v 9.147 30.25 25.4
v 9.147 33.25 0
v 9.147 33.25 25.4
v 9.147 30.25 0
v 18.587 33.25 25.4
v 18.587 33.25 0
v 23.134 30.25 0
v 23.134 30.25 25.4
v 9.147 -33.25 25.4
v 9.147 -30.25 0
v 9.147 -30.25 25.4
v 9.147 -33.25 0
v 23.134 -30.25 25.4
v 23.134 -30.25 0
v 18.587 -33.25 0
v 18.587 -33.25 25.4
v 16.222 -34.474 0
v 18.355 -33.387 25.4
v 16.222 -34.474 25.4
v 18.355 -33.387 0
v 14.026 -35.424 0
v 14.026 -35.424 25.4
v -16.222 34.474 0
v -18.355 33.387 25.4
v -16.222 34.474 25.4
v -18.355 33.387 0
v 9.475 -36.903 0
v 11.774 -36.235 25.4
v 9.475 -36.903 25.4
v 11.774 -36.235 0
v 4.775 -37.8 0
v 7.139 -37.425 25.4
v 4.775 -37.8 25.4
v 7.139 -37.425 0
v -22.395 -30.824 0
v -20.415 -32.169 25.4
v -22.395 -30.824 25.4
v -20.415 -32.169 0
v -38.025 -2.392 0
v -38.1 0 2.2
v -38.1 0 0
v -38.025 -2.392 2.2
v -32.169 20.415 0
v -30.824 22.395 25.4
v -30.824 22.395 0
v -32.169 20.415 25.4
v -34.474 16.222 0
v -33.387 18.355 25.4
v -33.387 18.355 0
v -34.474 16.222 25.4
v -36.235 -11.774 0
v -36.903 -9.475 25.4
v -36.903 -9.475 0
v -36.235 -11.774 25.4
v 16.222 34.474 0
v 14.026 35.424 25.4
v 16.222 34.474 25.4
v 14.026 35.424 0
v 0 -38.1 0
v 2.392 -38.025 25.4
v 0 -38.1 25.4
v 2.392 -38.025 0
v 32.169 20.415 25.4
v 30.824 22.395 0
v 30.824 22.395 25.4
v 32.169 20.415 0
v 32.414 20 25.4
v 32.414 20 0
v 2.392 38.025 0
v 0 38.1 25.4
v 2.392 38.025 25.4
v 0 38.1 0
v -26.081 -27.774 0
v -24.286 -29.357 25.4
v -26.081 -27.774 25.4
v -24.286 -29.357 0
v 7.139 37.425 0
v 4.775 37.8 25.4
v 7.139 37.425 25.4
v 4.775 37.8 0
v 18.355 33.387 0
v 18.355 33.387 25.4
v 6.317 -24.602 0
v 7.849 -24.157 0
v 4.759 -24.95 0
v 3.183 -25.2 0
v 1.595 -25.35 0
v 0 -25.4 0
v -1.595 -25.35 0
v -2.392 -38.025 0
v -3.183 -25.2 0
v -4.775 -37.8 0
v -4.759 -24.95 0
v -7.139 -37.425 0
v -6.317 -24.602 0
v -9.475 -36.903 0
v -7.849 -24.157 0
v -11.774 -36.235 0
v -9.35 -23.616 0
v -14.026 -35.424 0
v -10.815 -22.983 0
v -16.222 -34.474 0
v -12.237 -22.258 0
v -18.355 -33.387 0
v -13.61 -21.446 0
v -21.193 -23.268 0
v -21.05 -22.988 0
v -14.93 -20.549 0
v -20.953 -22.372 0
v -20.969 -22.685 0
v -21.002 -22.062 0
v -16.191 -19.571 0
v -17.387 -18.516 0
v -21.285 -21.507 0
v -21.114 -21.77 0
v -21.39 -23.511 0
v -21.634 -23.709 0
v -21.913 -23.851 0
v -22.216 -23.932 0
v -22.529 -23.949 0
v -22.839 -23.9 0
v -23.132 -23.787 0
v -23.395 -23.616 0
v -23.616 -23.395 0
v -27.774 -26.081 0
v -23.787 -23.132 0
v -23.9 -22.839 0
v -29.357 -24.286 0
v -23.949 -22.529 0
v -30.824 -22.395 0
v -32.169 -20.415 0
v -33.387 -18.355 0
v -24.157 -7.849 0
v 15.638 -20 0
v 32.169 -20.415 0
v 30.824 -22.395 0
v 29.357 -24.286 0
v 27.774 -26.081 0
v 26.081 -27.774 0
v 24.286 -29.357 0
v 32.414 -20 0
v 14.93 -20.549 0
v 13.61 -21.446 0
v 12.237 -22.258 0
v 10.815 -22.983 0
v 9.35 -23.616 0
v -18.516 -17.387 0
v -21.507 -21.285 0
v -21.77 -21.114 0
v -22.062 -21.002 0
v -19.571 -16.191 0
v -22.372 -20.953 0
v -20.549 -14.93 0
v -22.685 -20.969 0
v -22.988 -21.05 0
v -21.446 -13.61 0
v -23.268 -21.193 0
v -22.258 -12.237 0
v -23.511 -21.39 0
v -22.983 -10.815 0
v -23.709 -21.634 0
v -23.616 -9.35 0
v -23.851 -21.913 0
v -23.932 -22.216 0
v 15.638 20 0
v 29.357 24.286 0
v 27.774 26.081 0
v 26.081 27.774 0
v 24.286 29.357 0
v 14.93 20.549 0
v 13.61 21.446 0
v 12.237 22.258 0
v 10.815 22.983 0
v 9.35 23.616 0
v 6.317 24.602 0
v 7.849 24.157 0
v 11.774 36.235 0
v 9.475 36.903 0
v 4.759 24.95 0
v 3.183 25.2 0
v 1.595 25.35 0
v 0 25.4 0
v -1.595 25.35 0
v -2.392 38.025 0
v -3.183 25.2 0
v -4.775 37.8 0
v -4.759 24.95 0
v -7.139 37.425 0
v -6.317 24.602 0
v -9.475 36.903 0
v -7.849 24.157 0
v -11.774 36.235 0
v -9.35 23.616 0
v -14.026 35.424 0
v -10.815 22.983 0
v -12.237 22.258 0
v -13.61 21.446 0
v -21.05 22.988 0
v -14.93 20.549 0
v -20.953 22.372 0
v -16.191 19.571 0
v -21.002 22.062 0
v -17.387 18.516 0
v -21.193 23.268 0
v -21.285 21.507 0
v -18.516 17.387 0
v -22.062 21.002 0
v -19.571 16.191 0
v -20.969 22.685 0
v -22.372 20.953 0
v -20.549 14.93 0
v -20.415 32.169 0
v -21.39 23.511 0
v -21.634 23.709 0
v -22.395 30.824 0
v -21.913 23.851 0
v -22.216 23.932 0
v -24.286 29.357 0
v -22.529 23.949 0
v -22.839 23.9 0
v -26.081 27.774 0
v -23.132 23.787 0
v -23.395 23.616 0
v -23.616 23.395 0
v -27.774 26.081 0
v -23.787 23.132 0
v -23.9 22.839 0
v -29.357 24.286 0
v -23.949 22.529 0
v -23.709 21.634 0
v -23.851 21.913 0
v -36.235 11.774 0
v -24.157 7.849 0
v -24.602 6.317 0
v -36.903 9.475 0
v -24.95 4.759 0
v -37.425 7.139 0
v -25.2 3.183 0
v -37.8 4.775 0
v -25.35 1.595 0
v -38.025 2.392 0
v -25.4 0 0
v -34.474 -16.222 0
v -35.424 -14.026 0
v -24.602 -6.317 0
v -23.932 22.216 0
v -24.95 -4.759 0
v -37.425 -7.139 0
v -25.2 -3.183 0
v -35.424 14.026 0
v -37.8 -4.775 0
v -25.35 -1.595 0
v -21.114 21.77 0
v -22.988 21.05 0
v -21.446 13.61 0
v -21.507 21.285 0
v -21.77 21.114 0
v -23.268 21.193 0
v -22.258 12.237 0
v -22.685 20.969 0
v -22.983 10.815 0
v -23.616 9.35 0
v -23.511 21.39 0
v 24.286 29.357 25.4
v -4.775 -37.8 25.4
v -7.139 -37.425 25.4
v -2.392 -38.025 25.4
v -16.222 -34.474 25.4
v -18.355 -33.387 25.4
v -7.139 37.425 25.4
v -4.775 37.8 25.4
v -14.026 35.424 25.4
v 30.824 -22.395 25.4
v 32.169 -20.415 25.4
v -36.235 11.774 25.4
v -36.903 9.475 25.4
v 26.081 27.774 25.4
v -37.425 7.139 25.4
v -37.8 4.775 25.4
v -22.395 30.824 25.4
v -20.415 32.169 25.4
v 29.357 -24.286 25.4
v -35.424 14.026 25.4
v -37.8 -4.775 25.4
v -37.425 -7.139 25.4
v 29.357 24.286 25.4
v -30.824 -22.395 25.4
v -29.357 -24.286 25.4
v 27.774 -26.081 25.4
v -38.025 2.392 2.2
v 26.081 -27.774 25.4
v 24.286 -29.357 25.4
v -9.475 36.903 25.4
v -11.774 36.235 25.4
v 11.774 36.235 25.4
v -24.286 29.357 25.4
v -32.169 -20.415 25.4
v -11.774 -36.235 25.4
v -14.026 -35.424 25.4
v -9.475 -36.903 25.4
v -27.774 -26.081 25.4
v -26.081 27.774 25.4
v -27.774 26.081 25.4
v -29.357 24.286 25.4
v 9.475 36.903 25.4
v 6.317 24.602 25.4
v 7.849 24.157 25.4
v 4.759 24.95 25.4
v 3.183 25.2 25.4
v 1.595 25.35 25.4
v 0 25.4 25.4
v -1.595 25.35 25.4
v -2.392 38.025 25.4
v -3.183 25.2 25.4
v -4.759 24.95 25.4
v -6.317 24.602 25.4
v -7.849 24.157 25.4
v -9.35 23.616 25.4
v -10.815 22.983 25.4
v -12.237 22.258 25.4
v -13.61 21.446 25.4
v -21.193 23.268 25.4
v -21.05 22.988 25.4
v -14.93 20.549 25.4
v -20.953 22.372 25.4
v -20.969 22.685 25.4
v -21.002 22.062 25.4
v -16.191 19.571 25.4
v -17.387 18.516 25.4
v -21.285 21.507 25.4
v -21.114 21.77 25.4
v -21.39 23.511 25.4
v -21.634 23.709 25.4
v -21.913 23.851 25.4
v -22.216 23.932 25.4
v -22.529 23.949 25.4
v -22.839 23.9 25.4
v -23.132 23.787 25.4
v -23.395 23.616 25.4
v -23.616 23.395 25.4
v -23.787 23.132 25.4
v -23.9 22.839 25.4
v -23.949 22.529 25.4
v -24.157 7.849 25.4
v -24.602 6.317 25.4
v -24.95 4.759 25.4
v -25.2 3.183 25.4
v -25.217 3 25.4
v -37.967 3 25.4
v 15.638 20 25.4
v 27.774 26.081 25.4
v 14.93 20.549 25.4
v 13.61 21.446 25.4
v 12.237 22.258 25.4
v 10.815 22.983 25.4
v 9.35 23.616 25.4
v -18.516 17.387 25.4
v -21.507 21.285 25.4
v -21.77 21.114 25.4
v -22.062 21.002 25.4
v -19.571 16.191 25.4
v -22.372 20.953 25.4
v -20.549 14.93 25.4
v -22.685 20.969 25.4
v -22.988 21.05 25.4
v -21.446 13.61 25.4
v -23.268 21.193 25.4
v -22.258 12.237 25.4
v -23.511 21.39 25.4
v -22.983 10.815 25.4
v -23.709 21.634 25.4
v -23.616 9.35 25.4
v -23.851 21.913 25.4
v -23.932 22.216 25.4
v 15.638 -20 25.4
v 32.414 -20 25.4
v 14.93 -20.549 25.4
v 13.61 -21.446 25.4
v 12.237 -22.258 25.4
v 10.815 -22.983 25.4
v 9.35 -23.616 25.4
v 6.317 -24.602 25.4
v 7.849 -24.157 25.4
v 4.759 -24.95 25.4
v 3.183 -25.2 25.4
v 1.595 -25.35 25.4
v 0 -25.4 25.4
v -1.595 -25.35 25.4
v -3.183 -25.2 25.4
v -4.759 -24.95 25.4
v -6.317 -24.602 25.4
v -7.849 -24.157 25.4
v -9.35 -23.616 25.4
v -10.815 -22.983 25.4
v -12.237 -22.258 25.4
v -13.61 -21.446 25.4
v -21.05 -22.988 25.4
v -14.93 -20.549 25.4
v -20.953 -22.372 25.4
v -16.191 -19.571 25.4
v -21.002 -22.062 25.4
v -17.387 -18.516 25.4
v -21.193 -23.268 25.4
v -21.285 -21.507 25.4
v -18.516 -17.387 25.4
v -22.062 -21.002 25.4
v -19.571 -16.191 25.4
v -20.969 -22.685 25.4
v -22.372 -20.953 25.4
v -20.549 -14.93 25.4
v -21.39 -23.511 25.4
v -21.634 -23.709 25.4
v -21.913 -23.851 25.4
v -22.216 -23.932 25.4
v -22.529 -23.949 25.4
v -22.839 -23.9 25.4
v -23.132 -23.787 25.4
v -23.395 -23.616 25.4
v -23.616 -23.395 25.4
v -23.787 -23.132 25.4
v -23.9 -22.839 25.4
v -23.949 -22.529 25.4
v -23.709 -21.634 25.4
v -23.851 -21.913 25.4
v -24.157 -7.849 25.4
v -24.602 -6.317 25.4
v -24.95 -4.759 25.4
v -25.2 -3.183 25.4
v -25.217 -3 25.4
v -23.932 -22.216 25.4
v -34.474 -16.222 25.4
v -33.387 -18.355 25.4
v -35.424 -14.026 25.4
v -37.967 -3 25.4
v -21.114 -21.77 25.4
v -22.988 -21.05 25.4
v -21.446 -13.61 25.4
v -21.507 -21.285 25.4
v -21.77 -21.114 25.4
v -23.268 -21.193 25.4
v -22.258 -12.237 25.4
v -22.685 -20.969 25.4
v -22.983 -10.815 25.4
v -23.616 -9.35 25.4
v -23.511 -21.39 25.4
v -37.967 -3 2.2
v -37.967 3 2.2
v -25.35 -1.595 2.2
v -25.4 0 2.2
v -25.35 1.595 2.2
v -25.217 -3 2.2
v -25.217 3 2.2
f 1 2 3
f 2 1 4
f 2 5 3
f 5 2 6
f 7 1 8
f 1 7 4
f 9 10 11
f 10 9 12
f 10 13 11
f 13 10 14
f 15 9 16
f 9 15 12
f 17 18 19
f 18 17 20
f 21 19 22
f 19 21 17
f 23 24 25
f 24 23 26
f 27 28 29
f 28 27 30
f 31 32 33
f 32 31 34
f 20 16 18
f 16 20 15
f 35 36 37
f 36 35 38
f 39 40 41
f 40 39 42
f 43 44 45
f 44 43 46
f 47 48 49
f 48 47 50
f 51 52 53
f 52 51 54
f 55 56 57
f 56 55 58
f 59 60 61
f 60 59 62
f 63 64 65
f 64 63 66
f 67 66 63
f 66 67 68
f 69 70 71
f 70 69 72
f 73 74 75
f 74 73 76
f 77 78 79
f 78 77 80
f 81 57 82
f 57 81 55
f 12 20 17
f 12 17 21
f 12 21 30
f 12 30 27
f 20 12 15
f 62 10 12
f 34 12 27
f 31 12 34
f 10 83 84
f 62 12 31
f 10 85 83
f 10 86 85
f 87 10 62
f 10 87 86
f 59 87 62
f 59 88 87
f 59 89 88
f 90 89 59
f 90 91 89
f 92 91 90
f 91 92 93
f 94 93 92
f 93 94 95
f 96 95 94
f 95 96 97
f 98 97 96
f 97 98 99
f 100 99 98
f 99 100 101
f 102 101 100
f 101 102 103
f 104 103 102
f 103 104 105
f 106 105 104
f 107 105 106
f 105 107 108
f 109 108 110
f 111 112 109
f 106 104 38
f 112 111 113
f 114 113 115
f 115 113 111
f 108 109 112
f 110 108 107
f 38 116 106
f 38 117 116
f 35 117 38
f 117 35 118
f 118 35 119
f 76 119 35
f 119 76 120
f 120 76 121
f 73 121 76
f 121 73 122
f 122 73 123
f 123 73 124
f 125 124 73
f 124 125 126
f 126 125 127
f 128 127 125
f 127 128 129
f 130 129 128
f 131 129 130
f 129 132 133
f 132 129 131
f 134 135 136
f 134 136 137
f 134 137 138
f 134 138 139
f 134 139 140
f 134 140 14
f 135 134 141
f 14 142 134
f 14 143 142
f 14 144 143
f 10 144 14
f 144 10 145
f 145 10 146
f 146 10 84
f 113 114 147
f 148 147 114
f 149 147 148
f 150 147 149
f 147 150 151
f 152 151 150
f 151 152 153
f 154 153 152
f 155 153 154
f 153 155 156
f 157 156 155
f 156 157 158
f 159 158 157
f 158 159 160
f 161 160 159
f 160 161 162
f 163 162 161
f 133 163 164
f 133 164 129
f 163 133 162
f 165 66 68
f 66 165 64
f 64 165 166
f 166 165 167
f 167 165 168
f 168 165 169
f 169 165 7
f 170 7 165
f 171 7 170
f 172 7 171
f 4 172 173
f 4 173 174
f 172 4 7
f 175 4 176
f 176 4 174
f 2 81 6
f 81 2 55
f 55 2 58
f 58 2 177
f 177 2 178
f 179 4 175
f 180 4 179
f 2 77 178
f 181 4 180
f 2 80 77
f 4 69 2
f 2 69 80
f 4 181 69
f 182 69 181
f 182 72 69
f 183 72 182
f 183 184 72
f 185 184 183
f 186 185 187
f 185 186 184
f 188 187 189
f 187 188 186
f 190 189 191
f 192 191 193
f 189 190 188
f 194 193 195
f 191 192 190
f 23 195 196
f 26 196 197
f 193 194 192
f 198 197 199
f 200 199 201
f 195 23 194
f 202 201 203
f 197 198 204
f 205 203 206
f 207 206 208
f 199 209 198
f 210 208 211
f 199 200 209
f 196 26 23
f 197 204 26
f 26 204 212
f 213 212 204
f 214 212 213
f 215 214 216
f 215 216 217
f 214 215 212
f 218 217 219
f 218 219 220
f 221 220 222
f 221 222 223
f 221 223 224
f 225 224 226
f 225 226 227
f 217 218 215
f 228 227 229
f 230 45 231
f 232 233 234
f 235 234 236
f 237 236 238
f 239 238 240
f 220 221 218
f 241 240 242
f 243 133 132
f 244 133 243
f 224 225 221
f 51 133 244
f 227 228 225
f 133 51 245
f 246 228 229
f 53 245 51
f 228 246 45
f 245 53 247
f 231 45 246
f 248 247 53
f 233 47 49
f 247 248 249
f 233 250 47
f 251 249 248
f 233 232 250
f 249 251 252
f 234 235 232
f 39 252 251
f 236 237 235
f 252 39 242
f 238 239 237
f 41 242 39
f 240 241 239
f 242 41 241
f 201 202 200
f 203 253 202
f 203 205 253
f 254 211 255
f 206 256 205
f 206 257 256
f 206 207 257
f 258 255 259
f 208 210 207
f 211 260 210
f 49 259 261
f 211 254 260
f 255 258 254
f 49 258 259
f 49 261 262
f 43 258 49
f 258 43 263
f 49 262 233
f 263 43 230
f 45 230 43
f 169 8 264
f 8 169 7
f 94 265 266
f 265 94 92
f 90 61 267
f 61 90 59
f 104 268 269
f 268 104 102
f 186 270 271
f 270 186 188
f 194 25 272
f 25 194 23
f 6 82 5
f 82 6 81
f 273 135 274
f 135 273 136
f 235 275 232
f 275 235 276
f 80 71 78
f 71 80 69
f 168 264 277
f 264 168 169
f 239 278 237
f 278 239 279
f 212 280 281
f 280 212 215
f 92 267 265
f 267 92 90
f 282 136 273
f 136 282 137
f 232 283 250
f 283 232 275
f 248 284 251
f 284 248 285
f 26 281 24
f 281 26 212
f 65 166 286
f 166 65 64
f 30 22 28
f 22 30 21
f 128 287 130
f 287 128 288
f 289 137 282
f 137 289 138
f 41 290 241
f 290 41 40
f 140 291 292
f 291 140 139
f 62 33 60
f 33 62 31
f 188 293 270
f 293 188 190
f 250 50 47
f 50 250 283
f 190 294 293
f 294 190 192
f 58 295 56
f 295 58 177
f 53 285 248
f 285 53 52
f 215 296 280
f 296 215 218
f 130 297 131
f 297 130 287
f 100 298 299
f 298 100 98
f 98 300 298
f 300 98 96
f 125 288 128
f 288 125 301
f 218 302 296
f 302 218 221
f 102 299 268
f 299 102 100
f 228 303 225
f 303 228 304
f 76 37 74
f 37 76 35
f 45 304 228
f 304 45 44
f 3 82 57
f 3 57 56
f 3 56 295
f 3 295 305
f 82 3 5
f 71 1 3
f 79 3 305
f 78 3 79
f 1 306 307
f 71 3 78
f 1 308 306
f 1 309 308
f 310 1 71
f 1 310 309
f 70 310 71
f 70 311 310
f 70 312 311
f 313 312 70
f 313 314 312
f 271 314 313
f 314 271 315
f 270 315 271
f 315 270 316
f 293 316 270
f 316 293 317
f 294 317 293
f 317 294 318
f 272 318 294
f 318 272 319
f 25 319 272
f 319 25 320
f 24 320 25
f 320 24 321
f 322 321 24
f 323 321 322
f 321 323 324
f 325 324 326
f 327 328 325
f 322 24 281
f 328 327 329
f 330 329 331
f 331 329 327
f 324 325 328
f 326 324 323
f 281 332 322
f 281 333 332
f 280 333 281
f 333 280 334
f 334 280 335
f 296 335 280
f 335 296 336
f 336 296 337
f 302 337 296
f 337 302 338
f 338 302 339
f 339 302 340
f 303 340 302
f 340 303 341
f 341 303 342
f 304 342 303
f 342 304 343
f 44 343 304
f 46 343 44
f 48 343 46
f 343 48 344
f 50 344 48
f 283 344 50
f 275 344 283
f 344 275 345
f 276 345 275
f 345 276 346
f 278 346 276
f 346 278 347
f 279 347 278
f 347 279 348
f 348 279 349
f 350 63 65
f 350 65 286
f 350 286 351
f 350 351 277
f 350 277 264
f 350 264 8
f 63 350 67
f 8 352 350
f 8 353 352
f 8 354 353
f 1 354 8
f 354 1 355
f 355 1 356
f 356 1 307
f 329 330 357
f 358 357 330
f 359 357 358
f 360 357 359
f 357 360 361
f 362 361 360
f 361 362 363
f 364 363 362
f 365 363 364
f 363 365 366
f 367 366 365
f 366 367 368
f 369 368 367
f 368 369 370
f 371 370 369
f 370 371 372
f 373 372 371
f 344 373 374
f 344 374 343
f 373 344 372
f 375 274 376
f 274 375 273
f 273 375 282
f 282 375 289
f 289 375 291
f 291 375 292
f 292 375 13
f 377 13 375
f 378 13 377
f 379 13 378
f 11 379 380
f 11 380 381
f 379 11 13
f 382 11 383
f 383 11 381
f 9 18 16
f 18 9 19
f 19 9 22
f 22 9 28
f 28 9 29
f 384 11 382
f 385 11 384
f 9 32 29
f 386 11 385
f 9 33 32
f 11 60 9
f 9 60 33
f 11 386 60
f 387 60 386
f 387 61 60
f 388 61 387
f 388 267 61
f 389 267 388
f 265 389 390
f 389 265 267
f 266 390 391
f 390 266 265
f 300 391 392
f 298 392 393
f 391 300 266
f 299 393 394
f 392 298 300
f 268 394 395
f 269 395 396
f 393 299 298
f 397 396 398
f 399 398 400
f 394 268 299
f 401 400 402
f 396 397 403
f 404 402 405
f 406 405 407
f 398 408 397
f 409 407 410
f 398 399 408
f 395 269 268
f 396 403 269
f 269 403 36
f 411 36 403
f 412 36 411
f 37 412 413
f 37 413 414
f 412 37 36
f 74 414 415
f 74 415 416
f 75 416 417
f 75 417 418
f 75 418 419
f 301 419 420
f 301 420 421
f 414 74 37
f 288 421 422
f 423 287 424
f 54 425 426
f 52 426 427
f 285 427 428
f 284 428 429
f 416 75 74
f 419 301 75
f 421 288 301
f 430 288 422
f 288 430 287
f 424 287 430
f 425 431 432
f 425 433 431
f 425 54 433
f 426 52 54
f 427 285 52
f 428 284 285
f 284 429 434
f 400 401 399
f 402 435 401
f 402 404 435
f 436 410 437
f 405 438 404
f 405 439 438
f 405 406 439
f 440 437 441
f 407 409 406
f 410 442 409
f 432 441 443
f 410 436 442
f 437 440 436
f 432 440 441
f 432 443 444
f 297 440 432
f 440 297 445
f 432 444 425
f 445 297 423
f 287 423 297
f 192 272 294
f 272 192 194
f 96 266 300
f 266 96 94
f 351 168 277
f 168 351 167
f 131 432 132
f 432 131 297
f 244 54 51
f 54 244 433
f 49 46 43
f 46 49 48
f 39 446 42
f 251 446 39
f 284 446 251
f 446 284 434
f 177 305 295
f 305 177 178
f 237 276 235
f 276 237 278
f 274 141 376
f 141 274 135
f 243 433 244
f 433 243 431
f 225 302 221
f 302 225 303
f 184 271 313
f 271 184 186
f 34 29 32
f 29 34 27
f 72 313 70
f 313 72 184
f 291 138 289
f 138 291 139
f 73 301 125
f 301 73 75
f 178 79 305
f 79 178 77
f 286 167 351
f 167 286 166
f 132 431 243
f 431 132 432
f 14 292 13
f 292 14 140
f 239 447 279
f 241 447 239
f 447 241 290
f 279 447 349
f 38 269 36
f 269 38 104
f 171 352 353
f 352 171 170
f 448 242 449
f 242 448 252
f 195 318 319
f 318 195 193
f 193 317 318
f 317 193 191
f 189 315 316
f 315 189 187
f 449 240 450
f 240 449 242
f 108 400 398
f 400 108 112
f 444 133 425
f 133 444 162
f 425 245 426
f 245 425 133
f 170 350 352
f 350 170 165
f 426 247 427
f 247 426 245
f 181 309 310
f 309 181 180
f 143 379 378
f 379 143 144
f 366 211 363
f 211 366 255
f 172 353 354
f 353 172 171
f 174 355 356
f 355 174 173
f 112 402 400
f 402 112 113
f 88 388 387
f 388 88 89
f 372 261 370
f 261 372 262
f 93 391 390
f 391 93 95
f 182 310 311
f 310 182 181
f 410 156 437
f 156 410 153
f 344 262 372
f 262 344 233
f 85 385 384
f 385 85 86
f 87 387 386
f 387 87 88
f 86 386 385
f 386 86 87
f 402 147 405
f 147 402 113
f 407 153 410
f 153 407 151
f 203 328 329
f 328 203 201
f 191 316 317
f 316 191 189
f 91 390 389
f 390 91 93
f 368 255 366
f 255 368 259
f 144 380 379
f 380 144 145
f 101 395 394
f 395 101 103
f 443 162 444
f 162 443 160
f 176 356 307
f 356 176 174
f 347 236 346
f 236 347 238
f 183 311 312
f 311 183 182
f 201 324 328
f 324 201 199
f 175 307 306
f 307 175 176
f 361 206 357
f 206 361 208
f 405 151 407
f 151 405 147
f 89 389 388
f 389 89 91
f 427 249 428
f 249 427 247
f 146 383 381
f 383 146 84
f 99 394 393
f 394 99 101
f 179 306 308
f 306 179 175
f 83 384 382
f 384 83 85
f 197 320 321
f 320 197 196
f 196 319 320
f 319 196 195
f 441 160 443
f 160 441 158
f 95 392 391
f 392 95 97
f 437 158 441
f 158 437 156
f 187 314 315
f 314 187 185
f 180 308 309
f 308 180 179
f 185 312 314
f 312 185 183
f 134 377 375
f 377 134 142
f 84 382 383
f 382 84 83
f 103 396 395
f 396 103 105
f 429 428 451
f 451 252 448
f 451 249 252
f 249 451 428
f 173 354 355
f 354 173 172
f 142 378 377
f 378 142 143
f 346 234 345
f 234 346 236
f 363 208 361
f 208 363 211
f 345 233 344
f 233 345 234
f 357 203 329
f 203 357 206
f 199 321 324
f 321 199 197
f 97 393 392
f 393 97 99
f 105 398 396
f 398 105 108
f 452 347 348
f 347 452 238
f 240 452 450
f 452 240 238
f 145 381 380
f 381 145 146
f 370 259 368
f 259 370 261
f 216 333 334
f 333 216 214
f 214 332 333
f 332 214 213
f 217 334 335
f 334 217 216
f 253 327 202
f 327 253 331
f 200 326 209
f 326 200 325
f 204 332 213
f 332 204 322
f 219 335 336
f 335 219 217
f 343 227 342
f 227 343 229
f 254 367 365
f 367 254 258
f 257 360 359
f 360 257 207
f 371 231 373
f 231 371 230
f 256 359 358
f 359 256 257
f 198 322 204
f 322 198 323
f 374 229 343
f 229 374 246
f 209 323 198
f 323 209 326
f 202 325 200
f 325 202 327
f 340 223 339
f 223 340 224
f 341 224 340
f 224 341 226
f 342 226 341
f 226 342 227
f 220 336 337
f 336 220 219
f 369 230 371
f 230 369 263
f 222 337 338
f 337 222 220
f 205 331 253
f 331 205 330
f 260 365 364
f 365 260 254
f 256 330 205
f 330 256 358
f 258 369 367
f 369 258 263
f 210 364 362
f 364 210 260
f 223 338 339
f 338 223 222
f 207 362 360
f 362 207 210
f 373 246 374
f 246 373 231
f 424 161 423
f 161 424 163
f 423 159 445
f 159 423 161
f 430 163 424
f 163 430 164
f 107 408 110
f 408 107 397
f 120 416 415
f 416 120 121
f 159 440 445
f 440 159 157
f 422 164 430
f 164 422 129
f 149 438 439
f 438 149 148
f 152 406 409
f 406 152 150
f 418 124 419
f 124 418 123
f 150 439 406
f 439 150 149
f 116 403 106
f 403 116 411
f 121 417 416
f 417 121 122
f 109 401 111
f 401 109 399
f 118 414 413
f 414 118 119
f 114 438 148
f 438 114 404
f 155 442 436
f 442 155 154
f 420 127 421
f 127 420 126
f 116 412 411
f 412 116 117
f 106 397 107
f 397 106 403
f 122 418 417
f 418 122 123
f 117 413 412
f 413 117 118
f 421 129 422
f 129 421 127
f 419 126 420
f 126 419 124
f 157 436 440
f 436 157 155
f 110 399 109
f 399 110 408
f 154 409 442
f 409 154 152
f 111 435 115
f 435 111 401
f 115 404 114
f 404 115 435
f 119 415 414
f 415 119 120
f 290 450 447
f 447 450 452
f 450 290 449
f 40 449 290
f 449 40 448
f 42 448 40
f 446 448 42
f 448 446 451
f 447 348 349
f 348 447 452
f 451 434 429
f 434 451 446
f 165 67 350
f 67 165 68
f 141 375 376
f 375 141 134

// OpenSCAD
inch = 25.4;

D = 3 * inch;
H = 1 * inch;

module acr(){
  #translate([9.147,  1.25 * inch, -1])translate([0, -1.5, 0])cube([12.28 * inch, 3, 1*inch + 2]);
  #translate([9.147,  -1.25 * inch, -1])translate([0, -1.5, 0])cube([12.28 * inch, 3, 1*inch + 2]);
}
module endcap(){
  difference(){
    cylinder(h=H, d=D, $fn=100);
    translate([0, 0, -1])cylinder(h=H + 2, d=D-1*inch, $fn=100);
    rotate([0, 0, 45])translate([0, 1.25 * inch, -1])cylinder(h=H+2, d=3, $fn=30);
    rotate([0, 0, 45+90])translate([0, 1.25 * inch, -1])cylinder(h=H+2, d=3, $fn=30);
    translate([-2.5*inch, -3, 2.2])cube([18 * inch, 6, 9 * inch]);
    translate([0, -20, -3])cube([18 * inch, 40, 9 * inch]);
    acr();
  }
}
module endcaps(){
  endcap();
  translate([(16 - 3) * inch, 0, 1*inch])rotate([0, 0, 180])rotate([180, 0, 0])endcap();
}

//endcap();
//endcaps();
//translate([12.28 * inch/2, 1. * inch, -1])cylinder(h=H+2, d=3, $fn=30);
//translate([12.28 * inch/2, -1. * inch, -1])cylinder(h=H+2, d=3, $fn=30);

module support(){
  translate([7.5*inch, 1.25*inch - 1.5 - 5.5, 0])
    difference(){
    linear_extrude(height=inch)polygon([[-3, -4], [-5, 5.5], [5, 5.5],[3, -4]]);
    translate([0, 0, -1])cylinder(d=3, h=inch + 2, $fn=30);
  }
}
module supports(){
  support();
  mirror([0, 1, 0])support();
}
//supports();
//support();
endcap();
